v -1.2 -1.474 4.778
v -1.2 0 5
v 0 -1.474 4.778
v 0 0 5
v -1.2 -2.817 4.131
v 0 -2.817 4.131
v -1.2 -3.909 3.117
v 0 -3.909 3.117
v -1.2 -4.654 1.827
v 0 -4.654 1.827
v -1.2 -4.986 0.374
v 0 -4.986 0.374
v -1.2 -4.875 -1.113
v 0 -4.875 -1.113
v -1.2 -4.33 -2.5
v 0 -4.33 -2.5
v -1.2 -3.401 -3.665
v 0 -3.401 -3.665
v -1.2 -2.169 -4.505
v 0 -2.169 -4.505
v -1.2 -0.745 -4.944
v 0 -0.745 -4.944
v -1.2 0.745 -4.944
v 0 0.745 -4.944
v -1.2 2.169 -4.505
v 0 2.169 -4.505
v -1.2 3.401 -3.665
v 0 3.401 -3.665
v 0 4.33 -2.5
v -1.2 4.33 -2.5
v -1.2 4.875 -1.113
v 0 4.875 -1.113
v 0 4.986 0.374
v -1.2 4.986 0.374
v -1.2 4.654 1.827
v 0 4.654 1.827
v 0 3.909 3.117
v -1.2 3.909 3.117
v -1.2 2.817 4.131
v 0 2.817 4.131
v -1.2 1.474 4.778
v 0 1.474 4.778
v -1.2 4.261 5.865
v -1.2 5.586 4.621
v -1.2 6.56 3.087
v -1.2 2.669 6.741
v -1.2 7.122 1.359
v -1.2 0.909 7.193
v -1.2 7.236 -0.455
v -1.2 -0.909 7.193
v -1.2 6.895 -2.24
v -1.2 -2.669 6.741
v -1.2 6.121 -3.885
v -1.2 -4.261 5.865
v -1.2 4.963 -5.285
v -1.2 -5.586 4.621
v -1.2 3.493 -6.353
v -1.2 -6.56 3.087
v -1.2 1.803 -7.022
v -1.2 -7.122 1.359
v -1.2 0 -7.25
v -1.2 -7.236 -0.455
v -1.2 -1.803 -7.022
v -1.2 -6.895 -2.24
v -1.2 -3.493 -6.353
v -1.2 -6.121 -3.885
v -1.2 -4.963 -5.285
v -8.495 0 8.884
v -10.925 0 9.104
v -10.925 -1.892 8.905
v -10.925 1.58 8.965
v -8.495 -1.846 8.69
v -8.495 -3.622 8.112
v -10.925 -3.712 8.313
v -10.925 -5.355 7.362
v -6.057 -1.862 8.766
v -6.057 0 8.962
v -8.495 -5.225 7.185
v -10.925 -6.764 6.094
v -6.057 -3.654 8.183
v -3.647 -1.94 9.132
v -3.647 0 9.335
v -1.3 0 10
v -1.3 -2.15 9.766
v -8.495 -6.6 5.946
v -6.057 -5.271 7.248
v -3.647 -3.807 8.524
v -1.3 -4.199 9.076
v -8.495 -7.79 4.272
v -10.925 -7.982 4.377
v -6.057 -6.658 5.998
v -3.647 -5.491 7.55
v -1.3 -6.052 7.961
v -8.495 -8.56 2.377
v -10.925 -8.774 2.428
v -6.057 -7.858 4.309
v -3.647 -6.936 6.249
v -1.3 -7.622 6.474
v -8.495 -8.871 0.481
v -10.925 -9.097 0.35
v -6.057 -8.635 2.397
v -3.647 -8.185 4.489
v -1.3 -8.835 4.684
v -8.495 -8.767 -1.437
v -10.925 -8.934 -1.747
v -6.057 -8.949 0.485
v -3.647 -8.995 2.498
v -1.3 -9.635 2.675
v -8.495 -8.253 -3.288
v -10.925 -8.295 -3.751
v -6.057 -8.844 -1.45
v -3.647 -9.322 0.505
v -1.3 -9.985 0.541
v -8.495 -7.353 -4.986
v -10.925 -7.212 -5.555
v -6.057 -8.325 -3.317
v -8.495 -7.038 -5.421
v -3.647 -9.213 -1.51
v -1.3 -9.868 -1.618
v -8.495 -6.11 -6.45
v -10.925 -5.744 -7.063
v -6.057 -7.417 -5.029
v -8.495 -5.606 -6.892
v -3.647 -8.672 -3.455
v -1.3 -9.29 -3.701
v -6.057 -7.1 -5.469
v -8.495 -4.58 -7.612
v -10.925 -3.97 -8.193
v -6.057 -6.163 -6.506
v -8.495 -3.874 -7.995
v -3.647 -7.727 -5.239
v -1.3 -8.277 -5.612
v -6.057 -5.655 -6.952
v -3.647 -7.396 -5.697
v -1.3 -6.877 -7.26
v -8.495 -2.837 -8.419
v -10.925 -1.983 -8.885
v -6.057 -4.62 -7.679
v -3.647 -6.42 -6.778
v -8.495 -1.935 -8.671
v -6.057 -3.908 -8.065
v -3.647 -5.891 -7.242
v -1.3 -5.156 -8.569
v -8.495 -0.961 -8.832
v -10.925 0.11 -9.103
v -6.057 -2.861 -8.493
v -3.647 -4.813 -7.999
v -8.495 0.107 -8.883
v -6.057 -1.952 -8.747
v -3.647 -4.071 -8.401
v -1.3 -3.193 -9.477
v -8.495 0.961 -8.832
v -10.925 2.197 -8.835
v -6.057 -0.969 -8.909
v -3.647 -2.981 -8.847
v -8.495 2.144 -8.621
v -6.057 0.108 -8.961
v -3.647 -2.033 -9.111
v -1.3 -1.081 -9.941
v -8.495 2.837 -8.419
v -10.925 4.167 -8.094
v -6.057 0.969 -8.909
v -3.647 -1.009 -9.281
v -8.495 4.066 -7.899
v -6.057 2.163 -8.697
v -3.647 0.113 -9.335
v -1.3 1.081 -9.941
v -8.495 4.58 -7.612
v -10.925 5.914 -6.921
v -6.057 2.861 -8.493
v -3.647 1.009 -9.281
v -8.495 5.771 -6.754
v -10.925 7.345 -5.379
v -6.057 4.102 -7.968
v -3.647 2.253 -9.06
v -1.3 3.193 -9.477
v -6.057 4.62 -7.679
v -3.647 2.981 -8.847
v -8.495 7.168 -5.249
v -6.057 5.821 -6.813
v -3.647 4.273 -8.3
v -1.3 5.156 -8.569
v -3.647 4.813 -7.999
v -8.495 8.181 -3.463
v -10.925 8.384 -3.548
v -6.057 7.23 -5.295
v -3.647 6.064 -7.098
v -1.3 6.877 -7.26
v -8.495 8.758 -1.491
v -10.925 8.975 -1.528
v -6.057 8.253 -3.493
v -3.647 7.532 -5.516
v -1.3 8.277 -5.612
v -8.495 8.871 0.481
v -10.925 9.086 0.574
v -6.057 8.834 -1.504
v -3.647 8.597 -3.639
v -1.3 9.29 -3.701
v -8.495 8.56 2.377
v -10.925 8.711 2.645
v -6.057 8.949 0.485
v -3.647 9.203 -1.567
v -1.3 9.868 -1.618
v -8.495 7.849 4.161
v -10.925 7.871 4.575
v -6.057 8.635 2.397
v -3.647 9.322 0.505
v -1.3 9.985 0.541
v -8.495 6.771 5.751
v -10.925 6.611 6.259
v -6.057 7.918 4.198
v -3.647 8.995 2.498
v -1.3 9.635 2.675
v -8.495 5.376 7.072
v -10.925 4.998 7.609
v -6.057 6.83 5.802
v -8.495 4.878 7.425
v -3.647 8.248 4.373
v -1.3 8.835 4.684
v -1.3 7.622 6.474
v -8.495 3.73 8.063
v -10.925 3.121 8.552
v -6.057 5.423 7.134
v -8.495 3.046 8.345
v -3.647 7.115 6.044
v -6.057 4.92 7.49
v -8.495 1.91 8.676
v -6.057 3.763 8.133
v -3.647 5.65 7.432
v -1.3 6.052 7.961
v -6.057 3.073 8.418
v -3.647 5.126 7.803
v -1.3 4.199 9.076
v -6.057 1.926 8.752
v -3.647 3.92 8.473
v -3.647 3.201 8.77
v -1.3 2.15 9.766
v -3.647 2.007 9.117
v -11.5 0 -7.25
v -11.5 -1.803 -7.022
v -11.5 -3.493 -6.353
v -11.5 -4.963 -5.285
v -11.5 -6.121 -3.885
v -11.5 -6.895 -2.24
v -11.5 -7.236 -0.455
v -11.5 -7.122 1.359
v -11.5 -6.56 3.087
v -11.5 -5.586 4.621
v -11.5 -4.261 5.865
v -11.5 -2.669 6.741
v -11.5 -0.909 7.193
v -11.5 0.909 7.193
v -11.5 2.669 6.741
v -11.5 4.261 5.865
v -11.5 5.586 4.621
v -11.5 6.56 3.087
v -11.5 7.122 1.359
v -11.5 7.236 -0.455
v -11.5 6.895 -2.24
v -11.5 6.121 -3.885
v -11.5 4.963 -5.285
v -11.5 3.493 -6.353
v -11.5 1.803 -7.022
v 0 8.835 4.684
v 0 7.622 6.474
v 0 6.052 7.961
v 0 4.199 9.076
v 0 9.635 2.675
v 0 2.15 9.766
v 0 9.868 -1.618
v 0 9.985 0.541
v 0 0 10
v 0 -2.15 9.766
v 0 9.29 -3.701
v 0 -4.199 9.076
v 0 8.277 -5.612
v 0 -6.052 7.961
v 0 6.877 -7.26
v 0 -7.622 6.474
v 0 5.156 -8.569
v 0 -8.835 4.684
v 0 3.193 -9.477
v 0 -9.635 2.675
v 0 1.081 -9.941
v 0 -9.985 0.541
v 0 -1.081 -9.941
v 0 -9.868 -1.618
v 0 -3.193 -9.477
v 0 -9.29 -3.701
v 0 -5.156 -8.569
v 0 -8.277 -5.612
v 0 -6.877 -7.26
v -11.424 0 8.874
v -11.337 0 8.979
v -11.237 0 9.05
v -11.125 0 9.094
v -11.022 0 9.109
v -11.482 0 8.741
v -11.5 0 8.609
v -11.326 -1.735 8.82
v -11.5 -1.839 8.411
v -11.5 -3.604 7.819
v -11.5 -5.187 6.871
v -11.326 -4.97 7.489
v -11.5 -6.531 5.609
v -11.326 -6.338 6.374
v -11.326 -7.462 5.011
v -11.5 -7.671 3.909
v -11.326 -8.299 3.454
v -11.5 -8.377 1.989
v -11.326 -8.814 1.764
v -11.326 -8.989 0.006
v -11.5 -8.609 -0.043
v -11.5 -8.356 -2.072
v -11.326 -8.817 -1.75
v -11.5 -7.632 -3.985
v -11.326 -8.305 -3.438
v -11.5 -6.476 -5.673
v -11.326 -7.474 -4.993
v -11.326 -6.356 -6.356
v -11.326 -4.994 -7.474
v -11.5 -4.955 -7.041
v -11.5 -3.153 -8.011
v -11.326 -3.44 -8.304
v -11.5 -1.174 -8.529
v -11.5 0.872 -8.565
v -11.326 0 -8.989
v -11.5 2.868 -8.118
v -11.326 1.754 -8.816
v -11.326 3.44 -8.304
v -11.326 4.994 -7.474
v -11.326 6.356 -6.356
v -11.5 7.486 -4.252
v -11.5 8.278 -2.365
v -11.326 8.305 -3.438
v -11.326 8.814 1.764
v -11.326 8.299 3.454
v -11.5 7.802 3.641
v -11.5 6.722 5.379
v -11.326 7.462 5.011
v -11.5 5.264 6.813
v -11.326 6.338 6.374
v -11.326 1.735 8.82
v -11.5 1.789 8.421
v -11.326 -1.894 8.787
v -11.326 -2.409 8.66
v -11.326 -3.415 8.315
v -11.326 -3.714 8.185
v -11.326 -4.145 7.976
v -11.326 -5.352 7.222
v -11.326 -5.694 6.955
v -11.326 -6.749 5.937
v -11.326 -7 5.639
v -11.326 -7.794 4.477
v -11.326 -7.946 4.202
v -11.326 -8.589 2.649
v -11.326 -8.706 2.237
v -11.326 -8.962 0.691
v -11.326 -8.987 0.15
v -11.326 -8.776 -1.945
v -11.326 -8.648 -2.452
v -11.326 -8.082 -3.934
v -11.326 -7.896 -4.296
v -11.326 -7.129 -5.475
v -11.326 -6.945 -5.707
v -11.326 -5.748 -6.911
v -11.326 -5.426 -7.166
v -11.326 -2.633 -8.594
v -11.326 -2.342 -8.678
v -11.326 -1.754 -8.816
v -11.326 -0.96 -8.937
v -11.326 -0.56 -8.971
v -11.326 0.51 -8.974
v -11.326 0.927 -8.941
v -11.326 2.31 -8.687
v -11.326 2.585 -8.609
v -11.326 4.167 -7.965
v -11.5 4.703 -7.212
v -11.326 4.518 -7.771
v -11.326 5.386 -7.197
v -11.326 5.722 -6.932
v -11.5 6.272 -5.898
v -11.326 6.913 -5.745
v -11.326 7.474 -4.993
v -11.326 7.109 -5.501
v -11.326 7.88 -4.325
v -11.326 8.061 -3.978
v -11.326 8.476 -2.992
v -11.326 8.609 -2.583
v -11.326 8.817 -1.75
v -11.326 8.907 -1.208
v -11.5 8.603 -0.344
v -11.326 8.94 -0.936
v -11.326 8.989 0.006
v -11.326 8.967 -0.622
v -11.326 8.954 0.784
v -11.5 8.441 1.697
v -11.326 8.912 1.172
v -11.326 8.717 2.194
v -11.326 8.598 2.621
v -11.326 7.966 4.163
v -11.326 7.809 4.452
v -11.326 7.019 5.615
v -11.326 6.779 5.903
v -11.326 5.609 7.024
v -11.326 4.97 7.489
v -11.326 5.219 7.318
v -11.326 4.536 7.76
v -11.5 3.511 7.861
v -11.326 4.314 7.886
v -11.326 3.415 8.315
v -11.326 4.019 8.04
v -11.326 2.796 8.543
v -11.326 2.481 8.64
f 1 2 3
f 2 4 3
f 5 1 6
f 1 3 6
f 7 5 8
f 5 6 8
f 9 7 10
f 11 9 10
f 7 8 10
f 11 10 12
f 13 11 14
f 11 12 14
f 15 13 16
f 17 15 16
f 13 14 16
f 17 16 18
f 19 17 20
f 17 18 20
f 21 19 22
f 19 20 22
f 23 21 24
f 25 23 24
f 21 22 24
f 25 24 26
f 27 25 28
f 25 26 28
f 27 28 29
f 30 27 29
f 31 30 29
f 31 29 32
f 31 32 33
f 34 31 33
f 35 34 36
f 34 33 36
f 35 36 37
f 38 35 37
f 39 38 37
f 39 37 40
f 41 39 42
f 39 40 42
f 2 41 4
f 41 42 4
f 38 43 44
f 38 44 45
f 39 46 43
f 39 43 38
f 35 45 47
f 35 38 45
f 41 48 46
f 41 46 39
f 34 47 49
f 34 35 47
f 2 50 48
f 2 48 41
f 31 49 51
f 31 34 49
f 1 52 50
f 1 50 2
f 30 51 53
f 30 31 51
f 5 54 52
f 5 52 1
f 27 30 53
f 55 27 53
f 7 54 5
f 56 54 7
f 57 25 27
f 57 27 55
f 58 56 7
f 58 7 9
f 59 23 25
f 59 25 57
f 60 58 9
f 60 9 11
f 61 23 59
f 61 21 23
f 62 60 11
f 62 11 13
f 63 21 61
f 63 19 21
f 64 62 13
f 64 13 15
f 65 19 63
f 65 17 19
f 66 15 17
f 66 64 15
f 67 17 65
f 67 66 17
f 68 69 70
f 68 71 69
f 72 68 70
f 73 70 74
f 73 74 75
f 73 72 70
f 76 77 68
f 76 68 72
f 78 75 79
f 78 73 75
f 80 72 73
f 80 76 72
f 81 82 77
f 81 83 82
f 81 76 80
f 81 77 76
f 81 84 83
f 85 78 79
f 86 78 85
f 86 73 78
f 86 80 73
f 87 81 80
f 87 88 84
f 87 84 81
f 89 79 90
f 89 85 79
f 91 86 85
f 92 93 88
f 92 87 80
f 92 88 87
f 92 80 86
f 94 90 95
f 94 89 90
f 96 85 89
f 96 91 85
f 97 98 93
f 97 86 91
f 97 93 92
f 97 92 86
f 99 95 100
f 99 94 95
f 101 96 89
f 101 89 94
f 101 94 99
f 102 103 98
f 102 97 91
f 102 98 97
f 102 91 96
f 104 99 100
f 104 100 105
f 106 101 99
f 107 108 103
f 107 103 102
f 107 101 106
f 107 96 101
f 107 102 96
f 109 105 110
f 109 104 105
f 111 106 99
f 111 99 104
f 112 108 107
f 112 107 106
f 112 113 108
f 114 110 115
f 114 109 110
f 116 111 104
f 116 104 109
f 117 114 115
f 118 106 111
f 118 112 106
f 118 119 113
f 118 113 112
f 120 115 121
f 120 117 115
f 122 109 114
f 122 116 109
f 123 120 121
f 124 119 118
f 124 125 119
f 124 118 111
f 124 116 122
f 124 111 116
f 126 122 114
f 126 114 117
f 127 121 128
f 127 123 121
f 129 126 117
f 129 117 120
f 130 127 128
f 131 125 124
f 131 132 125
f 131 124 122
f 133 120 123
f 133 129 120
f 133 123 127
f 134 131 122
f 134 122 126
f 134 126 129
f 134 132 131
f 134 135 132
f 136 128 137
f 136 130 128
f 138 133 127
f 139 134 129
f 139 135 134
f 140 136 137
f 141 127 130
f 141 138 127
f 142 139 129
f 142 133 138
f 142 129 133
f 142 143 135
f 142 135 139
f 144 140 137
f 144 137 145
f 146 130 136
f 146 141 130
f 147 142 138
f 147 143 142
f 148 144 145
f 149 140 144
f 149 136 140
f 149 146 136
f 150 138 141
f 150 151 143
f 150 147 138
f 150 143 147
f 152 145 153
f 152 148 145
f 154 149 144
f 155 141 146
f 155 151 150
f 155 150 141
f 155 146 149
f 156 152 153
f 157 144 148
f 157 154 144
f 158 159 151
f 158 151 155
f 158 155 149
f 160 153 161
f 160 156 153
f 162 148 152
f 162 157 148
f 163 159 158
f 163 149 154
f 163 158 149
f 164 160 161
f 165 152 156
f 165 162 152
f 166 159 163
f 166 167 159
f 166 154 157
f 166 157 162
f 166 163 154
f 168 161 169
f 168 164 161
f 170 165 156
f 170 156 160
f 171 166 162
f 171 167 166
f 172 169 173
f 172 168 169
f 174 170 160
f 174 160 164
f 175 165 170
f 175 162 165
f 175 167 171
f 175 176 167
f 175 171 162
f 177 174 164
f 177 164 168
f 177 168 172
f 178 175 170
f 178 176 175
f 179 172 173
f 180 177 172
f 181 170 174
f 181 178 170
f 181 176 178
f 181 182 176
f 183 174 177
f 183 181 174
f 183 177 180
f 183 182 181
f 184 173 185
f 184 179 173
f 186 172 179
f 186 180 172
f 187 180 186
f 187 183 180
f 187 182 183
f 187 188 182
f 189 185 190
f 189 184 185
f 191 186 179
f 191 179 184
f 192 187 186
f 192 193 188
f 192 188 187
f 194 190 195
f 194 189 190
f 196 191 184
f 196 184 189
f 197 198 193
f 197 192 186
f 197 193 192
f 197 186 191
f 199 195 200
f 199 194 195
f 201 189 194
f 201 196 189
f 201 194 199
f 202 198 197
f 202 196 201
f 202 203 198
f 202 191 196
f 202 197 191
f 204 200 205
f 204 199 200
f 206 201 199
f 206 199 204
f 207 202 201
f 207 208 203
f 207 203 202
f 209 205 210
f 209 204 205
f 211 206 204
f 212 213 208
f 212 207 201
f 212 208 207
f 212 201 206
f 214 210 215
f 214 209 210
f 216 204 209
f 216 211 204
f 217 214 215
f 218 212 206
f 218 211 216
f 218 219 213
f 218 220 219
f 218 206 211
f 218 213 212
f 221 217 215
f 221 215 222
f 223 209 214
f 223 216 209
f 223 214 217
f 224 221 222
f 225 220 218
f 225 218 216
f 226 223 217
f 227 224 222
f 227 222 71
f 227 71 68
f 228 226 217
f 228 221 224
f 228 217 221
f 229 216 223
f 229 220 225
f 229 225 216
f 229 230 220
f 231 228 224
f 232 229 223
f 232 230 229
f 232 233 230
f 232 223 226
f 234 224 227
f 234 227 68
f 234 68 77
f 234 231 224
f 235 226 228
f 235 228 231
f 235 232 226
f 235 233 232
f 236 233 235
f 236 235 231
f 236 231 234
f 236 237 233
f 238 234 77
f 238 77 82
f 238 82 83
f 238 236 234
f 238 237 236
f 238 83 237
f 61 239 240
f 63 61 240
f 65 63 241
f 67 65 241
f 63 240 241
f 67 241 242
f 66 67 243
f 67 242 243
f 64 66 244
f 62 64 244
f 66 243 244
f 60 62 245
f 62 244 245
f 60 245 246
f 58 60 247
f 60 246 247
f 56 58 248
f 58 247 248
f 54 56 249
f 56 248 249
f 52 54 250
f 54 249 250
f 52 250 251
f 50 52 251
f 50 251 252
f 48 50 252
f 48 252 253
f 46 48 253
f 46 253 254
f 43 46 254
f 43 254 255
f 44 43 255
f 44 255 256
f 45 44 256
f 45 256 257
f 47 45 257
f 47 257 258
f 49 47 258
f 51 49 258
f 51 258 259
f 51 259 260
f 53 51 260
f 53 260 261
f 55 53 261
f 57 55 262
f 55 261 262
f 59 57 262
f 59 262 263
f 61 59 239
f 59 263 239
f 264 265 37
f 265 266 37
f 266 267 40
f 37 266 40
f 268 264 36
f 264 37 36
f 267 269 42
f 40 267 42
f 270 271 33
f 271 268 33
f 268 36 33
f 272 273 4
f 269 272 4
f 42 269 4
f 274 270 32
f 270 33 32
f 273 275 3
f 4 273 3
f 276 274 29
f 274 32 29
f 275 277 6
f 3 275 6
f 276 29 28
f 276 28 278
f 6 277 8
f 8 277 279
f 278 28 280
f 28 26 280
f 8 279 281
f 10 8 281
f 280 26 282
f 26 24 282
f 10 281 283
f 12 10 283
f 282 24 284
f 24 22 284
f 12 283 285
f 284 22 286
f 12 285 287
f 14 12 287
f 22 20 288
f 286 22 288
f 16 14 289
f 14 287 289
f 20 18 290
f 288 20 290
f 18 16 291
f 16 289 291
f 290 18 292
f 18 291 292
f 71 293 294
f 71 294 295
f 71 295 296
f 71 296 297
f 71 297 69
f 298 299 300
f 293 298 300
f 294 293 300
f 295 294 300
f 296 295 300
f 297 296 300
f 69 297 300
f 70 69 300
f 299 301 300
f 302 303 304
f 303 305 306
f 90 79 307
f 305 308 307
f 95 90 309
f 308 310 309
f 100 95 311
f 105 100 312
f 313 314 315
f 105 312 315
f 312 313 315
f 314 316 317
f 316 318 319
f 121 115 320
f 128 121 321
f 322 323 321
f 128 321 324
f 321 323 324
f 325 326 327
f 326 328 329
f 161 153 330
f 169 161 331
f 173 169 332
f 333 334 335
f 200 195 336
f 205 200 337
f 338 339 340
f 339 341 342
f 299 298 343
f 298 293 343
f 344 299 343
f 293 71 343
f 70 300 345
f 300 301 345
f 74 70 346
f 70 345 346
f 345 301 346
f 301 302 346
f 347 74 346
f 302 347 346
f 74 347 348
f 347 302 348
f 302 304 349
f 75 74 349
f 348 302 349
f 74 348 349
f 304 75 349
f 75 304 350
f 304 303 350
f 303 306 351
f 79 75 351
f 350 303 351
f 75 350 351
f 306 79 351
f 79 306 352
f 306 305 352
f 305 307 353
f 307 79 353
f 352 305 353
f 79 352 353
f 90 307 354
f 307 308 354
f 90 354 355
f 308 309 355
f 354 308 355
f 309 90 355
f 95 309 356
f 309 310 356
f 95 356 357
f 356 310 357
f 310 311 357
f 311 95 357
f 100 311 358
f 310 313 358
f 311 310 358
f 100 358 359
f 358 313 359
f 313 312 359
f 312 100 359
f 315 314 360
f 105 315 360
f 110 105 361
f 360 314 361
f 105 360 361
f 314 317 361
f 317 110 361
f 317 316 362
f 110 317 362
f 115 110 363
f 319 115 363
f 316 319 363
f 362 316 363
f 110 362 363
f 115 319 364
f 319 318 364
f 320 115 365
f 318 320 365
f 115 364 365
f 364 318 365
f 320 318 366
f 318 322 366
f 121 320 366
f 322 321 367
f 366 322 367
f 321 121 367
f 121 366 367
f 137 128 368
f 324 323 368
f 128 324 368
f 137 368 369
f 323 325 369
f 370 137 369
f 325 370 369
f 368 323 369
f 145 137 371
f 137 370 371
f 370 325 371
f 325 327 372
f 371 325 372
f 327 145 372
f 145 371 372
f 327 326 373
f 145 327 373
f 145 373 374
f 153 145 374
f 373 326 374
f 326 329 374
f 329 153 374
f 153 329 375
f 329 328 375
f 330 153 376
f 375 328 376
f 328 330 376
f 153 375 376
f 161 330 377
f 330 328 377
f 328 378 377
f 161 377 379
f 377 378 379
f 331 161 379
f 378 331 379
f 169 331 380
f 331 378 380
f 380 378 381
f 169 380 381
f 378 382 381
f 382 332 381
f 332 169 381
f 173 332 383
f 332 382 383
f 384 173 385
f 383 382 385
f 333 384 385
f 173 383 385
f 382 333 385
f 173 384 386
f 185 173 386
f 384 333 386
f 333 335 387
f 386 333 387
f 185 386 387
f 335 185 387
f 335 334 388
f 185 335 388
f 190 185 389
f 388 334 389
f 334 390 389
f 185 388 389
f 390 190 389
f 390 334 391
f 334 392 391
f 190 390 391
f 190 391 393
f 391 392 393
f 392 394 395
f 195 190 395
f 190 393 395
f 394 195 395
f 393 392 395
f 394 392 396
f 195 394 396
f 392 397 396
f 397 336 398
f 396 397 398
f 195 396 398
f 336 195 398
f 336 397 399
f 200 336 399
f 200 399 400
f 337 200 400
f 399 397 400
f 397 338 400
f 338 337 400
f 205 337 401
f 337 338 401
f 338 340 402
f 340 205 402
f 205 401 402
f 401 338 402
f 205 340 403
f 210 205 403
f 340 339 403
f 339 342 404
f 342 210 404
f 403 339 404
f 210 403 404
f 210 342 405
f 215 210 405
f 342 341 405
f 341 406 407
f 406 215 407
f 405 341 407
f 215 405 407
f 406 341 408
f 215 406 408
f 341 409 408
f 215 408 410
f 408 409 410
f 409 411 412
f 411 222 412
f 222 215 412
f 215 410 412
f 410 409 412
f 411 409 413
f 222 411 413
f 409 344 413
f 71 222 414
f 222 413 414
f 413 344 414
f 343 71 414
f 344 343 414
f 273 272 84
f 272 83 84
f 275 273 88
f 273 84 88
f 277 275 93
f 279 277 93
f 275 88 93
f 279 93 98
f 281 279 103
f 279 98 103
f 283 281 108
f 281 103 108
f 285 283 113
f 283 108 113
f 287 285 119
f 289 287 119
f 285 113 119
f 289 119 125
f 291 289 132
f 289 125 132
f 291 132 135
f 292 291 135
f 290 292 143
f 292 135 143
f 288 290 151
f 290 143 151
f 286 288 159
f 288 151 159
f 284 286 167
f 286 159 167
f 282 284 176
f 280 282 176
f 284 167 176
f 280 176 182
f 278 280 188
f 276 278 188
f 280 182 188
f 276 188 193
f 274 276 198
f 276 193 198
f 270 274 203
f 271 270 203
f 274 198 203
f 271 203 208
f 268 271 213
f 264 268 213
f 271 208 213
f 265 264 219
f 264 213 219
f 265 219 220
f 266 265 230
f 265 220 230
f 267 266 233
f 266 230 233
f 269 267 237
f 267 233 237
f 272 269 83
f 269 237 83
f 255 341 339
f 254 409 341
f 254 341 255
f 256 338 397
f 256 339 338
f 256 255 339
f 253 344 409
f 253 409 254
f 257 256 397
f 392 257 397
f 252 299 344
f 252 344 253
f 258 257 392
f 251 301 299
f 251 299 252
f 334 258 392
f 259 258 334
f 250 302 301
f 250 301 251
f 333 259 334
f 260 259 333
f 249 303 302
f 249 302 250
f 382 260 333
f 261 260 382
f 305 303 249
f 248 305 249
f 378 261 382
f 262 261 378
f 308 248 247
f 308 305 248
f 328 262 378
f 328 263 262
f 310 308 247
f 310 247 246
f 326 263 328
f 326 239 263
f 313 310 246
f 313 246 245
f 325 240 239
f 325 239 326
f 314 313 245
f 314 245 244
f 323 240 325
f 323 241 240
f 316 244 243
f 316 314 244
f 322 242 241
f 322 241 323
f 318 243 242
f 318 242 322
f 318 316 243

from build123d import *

# Parameters (mm, degrees)
HOLE001_D           = 10
HOLE001_CBORE_D     = 14.5
HOLE001_CBORE_DEPTH = 10.3
FILLET001_R         = 0.5


with BuildPart() as part:
    # Sketch011 → Revolution003 (revolve)
    with BuildSketch(Plane.XZ):
        with BuildLine():
            Line((0, 0), (-11.5, 0))
            Line((-11.5, 0), (-11.5, 9.2))
            ThreePointArc((-11.5, 9.2), (-6.347978, 8.936721), (-1.3, 10))
            Line((0, 10), (-1.3, 10))
            Line((0, 0), (0, 10))
        make_face()
    revolve(axis=Axis((0, 0, 0), (1, 0, 0)))

    # Hole001 (through all)
    with Locations(Plane(origin=(-11.5, 0, 0), x_dir=(0, 0, -1), z_dir=(-1, 0, 0))):
        with Locations((0, 0)):
            CounterBoreHole(HOLE001_D / 2, HOLE001_CBORE_D / 2, HOLE001_CBORE_DEPTH)

    # Fillet001
    fillet001_edges = [part.edges().sort_by_distance(p)[0] for p in [
        (-11.5, 0, -9.2),
    ]]
    fillet(fillet001_edges, radius=FILLET001_R)


solid = part.part
